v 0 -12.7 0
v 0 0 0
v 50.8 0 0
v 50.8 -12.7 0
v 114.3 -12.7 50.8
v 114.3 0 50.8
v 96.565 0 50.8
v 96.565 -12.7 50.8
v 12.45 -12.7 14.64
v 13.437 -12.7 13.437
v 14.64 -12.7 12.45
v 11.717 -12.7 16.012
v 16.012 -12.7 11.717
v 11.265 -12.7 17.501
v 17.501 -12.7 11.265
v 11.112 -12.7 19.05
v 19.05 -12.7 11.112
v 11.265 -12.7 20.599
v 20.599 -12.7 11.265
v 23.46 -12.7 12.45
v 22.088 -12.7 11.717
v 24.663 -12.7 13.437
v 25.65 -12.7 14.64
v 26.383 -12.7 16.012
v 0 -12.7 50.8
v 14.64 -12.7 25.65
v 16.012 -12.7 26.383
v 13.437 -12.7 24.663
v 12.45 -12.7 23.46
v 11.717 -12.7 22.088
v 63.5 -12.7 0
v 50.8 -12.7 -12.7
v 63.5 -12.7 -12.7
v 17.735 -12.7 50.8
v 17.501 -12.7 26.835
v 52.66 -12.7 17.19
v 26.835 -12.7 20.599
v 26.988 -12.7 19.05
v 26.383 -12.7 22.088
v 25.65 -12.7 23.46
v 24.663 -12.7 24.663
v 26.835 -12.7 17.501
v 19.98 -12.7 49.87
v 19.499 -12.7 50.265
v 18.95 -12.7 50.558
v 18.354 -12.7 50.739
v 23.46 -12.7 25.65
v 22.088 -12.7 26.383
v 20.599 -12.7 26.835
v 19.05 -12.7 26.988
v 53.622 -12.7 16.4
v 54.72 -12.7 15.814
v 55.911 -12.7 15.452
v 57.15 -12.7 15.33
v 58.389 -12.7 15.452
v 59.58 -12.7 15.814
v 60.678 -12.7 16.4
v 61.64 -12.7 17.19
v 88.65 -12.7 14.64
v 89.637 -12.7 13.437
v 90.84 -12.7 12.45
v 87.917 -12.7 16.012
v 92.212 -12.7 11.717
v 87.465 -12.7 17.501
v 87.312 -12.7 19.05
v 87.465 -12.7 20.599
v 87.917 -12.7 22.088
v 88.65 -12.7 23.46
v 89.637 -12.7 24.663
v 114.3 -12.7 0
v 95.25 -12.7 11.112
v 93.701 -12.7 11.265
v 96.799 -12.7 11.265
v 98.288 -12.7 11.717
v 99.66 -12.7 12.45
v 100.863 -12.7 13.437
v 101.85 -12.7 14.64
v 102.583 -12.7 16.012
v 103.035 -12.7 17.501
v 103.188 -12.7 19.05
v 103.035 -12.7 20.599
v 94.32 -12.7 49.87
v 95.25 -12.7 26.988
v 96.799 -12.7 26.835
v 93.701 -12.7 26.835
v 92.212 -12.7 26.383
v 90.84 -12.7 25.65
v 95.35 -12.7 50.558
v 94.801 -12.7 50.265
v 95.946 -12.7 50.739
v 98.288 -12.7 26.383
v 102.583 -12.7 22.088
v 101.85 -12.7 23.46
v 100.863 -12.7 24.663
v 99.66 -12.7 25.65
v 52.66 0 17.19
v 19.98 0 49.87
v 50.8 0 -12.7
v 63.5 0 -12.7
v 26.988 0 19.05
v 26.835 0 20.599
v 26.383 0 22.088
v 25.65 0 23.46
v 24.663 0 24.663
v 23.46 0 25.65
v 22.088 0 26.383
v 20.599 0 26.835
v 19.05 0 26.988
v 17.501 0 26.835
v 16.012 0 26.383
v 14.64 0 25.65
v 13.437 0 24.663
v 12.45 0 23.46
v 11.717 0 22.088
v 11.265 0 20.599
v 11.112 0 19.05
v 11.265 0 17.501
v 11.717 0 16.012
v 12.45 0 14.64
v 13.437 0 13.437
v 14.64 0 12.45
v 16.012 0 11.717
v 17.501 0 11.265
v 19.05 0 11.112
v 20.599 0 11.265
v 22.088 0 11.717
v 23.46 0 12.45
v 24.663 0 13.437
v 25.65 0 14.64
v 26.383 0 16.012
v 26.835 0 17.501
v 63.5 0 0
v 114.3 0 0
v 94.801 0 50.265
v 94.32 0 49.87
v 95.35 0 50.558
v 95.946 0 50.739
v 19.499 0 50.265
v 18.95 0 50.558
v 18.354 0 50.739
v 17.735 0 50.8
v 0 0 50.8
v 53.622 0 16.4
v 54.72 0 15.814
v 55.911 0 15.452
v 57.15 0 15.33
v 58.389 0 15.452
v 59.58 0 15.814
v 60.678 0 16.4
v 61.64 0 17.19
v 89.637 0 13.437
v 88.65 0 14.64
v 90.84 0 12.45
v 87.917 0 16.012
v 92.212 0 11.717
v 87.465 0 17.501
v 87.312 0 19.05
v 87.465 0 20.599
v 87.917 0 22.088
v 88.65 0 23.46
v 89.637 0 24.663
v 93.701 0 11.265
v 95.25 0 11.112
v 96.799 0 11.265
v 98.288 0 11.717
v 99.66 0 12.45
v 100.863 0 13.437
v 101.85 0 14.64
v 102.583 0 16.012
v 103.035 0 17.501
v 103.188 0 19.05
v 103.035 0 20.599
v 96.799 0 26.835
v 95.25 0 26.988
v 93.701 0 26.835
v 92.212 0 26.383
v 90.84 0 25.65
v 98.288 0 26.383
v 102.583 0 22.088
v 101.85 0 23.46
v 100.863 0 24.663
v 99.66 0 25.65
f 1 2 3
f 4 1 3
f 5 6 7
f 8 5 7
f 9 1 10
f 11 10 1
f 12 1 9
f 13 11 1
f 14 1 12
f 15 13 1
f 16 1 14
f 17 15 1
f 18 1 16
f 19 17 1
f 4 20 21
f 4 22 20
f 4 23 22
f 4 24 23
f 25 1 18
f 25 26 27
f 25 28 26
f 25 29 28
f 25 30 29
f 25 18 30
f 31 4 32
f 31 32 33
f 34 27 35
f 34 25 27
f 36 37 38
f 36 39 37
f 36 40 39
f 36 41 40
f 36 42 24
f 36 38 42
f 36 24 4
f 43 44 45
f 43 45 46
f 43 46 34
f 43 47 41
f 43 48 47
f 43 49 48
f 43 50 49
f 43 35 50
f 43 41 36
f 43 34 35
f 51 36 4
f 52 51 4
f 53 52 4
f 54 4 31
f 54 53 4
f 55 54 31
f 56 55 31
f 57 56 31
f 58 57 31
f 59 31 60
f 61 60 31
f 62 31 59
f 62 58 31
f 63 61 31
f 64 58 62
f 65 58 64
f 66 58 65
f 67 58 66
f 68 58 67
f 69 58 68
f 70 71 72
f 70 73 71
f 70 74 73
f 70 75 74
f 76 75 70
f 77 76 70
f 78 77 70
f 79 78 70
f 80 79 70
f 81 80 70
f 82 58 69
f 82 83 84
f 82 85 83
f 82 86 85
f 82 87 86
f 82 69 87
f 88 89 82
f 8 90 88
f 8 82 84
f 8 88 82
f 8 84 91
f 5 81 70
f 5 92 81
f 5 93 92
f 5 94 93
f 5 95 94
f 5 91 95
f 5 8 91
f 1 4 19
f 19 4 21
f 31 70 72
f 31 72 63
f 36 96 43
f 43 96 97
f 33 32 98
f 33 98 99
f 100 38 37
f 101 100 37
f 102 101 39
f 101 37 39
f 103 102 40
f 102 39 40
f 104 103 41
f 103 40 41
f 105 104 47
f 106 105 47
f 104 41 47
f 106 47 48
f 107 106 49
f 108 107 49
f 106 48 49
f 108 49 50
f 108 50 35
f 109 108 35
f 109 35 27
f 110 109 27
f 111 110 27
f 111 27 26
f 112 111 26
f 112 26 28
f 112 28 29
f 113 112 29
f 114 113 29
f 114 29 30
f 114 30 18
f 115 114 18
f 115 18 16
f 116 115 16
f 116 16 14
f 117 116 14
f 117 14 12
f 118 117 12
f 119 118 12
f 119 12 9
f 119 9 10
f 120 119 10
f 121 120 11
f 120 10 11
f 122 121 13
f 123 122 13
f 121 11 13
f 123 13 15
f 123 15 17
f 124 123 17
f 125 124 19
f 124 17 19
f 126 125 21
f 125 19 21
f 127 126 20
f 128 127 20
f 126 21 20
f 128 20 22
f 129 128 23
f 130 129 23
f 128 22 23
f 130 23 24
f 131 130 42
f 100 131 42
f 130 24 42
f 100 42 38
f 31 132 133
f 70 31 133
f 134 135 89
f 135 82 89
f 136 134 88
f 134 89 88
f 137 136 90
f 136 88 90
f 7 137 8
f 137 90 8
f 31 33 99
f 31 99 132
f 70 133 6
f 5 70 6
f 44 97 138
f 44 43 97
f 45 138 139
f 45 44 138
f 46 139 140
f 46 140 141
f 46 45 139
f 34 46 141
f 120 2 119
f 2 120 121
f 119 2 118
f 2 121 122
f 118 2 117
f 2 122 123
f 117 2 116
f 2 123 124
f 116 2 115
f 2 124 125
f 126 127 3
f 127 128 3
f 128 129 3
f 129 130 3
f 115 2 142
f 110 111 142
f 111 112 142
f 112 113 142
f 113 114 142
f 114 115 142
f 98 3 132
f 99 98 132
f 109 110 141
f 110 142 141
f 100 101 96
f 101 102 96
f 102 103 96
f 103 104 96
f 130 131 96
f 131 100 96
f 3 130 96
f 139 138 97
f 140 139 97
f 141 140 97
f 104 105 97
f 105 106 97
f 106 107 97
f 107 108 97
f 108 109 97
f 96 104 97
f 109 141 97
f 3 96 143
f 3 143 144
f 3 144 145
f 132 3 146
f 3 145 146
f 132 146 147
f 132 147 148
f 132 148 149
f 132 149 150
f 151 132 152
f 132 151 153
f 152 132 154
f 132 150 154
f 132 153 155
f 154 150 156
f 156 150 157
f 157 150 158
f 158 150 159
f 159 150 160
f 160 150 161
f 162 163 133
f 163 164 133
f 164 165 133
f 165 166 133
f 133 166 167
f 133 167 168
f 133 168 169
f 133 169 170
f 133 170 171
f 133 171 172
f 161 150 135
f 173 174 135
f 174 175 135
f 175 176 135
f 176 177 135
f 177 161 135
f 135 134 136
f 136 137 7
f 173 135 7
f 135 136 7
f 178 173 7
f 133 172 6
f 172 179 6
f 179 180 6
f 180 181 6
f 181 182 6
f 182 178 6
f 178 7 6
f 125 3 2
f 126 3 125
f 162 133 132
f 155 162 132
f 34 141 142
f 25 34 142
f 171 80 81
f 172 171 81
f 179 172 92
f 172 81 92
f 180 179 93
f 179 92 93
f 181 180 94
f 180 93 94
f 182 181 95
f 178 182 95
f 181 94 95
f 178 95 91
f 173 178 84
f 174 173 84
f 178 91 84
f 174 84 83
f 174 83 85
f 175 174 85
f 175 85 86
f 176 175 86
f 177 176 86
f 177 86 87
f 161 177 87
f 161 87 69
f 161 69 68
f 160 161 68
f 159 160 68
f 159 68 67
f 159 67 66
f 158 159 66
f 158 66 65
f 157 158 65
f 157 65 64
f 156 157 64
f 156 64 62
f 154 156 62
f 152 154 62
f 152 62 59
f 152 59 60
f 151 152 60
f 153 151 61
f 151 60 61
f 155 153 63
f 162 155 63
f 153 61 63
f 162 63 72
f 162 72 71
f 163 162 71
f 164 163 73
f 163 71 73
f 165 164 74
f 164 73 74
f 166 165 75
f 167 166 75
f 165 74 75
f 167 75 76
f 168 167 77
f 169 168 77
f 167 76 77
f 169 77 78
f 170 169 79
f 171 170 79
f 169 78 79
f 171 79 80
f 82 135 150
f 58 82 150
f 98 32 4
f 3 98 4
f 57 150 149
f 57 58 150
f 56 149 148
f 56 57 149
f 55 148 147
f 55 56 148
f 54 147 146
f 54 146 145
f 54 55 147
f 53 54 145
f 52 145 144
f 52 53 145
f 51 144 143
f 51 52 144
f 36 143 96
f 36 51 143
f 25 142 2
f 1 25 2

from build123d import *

# Parameters (mm, degrees)
F1_DEPTH = 12.7
F2_R     = 6.35
F3_R     = 3.175
F4_W     = 12.7
F4_H     = 12.7
F5_DEPTH = 12.7
F6_R     = 7.9375
F7_DEPTH = 25.4


with BuildPart() as f1:
    # F0 (on Front) → F1 (new body)
    with BuildSketch(Plane.XZ):
        Polygon((0, 50.8), (0, 0), (114.3, 0), (114.3, 50.8), (95.25, 50.8), (57.15, 12.7), (19.05, 50.8), align=None)
    extrude(amount=F1_DEPTH)

    # F2
    f2_edges = [f1.edges().sort_by_distance(p)[0] for p in [
        (57.15, -6.35, 12.7),
    ]]
    fillet(f2_edges, radius=F2_R)

    # F3
    f3_edges = [f1.edges().sort_by_distance(p)[0] for p in [
        (19.05, -6.35, 50.8),
        (95.25, -6.35, 50.8),
    ]]
    fillet(f3_edges, radius=F3_R)

    # F4 (on face) → F5 (join)
    with BuildSketch(Plane.XZ.offset(12.7)):
        with Locations((57.15, -6.35)):
            Rectangle(F4_W, F4_H)
    extrude(amount=-F5_DEPTH)

    # F6 (on face) → F7 (cut)
    with BuildSketch(Plane.XZ.offset(12.7)):
        with Locations((19.05, 19.05)):
            Circle(F6_R)
        with Locations((95.25, 19.05)):
            Circle(F6_R)
    extrude(amount=-F7_DEPTH, mode=Mode.SUBTRACT)


solid = f1.part
